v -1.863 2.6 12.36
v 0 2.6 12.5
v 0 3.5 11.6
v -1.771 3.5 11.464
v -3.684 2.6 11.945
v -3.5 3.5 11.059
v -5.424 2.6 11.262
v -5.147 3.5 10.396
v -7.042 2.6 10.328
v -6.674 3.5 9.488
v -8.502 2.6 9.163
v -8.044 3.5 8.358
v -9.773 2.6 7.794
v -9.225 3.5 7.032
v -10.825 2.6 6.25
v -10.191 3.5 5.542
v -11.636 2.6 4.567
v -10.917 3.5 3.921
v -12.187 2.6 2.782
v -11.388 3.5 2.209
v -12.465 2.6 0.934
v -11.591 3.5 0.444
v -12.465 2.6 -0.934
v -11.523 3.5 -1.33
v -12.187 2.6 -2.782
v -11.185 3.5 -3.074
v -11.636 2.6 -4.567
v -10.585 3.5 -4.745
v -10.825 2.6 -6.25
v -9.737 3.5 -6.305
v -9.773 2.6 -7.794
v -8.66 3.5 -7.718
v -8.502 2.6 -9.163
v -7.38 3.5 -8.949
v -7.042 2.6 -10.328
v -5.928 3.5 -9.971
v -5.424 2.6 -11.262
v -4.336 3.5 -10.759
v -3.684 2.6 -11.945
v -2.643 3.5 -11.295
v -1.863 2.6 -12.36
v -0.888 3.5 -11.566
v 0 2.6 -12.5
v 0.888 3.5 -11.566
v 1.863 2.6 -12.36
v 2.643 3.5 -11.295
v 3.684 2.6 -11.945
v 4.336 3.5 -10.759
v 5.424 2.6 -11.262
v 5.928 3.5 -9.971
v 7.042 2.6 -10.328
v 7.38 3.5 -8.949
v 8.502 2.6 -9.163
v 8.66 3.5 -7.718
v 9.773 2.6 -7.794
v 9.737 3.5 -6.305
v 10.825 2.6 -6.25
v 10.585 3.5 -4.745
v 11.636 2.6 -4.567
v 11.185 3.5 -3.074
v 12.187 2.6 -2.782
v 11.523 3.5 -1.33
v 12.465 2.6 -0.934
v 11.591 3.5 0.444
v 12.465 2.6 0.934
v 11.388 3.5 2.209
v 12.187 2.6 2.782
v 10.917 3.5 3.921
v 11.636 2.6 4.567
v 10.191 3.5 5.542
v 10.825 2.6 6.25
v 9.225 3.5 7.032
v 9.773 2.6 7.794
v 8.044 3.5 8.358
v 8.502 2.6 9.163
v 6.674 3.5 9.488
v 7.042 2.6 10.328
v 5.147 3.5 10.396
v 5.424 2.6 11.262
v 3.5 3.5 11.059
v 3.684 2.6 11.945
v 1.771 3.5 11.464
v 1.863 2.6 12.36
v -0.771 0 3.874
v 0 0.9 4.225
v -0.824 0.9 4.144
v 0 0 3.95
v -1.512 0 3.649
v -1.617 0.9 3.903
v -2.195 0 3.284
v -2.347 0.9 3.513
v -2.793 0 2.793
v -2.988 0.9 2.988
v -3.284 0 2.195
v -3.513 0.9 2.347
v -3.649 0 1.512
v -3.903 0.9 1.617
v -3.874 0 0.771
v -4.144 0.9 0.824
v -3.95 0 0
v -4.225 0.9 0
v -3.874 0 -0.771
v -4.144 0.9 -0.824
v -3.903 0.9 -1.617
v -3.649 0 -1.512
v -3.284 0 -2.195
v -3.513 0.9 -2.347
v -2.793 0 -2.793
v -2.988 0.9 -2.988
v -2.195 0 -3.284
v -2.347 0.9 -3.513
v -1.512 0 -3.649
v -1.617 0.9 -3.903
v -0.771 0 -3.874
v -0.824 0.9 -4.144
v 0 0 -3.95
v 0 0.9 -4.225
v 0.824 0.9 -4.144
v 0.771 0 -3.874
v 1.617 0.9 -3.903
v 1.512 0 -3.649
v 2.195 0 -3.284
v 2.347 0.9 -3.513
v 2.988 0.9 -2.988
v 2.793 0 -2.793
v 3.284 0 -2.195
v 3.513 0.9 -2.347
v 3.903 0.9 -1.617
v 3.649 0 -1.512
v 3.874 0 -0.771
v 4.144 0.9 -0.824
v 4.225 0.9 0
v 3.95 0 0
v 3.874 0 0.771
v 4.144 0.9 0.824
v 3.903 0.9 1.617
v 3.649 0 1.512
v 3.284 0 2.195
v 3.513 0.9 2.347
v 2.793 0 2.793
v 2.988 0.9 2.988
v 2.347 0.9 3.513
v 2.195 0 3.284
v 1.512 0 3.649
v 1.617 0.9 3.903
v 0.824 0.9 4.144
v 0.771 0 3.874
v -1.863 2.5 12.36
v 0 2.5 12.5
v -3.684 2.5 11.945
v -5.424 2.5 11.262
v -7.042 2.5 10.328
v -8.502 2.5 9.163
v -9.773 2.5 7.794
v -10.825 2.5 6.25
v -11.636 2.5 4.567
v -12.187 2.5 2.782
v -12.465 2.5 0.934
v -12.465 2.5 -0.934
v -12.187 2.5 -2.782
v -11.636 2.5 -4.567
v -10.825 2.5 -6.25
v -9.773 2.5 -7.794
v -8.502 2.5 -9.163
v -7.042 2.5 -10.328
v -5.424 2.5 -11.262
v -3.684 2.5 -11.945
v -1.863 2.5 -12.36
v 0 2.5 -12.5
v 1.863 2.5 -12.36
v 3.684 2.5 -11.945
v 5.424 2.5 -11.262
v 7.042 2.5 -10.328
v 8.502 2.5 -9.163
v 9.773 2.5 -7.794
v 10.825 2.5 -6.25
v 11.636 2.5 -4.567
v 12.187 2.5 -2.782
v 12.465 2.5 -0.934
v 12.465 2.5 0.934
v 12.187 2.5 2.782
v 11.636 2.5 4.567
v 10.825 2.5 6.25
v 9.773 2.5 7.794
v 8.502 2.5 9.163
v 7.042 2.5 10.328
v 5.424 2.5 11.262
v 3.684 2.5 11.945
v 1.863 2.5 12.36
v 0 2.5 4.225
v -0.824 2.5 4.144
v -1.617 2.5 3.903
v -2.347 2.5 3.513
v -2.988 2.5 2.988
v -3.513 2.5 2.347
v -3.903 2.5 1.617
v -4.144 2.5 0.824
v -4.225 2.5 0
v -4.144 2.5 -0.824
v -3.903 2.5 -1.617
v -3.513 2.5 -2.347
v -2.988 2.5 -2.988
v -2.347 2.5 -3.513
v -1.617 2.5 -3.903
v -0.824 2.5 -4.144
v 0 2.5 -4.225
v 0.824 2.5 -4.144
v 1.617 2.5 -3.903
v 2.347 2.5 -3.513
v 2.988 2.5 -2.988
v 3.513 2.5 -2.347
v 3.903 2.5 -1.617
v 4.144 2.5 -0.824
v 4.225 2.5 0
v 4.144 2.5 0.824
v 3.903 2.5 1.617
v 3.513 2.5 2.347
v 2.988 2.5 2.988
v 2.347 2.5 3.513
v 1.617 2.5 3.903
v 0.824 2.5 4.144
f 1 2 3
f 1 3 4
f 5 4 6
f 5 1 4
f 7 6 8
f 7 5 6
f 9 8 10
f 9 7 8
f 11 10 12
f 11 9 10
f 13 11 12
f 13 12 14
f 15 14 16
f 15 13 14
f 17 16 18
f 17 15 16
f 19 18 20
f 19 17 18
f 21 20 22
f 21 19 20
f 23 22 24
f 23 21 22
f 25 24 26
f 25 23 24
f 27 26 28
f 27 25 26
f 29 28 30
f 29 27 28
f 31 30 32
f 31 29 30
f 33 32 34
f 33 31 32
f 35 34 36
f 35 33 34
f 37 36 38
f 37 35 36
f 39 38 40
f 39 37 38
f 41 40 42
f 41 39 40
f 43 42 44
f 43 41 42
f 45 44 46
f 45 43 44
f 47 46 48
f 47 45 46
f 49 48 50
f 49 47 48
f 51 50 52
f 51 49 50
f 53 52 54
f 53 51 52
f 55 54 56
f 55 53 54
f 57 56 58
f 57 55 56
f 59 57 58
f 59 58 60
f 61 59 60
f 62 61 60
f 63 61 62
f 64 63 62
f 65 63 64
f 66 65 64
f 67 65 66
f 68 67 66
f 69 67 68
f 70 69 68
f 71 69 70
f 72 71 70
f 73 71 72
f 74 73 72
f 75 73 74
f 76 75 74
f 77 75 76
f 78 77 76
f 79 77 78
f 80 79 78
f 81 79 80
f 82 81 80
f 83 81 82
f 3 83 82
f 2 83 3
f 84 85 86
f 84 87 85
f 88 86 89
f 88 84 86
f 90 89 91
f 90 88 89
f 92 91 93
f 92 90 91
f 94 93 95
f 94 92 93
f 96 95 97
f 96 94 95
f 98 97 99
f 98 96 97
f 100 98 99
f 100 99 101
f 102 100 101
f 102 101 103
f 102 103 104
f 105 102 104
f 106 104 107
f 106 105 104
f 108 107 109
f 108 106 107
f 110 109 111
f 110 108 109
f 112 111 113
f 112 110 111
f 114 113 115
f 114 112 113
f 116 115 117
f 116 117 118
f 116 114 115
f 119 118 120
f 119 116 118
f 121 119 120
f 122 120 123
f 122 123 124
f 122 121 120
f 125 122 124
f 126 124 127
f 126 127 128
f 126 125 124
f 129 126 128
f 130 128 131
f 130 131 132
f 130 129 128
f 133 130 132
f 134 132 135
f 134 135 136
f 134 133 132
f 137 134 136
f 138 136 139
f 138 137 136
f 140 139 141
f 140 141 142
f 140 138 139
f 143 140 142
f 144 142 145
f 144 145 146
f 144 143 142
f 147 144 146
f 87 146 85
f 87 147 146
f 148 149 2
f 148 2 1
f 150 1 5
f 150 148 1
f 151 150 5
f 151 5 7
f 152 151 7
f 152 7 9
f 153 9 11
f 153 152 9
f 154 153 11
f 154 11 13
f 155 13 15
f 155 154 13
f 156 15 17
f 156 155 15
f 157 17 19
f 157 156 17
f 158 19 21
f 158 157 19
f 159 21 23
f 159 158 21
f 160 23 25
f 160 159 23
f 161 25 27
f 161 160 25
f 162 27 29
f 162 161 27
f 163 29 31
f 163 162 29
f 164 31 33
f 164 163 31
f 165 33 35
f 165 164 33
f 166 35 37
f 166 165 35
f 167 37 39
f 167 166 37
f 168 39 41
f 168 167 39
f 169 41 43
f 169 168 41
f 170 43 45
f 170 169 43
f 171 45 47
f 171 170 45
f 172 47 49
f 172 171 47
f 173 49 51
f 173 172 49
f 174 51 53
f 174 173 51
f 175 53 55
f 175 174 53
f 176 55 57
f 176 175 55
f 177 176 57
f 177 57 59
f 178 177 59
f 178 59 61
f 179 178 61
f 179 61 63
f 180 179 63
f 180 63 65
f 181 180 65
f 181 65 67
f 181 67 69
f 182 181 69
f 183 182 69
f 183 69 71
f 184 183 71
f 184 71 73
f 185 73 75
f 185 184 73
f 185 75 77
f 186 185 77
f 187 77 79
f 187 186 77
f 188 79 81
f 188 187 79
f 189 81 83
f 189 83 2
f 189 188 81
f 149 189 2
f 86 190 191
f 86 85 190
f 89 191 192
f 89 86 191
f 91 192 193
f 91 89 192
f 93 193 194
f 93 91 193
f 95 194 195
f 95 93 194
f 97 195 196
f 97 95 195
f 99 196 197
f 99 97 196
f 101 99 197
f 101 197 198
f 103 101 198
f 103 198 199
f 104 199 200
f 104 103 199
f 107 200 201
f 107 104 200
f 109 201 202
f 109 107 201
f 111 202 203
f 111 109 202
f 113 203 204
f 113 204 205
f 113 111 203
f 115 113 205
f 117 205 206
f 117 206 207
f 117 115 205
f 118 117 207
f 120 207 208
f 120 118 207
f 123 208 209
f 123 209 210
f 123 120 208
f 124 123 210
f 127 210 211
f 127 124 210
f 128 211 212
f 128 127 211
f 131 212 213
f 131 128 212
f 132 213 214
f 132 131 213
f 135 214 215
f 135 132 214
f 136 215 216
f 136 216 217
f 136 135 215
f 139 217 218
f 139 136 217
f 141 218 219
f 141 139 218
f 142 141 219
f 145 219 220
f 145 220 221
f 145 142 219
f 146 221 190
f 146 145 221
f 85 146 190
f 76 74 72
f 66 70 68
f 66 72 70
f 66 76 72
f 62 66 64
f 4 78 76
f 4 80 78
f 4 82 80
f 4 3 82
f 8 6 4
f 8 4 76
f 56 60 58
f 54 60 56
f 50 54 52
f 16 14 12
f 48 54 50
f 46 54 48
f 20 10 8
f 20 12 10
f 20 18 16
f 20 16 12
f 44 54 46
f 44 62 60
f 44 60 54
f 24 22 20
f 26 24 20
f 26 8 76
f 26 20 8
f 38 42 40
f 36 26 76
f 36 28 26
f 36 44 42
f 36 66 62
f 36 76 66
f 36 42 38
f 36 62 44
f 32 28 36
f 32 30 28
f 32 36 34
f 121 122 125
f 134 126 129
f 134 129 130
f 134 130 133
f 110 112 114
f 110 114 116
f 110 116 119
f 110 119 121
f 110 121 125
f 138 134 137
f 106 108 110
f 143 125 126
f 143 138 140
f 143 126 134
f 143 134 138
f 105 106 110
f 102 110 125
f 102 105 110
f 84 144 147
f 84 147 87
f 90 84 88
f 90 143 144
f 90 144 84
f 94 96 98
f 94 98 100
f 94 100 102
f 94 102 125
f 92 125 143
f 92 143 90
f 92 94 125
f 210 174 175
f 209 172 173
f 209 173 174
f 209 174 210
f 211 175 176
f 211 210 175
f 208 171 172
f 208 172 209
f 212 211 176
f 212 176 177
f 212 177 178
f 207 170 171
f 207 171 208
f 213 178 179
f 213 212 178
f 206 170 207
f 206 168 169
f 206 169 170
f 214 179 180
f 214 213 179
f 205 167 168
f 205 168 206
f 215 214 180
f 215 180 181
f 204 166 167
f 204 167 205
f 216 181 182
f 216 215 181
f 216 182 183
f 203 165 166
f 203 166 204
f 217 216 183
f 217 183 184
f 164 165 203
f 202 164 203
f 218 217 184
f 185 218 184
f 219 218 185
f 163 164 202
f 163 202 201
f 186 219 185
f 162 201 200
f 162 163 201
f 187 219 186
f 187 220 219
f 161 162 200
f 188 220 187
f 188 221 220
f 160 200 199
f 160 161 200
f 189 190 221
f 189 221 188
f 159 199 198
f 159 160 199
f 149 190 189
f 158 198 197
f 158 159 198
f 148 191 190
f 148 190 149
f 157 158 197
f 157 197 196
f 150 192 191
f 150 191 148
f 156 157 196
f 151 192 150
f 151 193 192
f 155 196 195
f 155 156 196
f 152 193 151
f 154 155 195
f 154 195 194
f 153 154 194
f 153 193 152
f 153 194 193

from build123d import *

# Parameters (mm, degrees)
F2_SIZE = 0.9


with BuildPart() as f1:
    # F0 (on Right) → F1 (revolve)
    with BuildSketch(Plane.YZ):
        Polygon((0, 0), (3.5, 0), (3.5, 12.5), (2.5, 12.5), (2.5, 4.225), (0.9, 4.225), (0, 3.95), align=None)
    revolve(axis=Axis((0, 1.75, 0), (0, -1, 0)))

    # F2
    f2_edges = [f1.edges().sort_by_distance(p)[0] for p in [
        (0, 3.5, -12.5),
    ]]
    chamfer(f2_edges, length=F2_SIZE)


solid = f1.part
